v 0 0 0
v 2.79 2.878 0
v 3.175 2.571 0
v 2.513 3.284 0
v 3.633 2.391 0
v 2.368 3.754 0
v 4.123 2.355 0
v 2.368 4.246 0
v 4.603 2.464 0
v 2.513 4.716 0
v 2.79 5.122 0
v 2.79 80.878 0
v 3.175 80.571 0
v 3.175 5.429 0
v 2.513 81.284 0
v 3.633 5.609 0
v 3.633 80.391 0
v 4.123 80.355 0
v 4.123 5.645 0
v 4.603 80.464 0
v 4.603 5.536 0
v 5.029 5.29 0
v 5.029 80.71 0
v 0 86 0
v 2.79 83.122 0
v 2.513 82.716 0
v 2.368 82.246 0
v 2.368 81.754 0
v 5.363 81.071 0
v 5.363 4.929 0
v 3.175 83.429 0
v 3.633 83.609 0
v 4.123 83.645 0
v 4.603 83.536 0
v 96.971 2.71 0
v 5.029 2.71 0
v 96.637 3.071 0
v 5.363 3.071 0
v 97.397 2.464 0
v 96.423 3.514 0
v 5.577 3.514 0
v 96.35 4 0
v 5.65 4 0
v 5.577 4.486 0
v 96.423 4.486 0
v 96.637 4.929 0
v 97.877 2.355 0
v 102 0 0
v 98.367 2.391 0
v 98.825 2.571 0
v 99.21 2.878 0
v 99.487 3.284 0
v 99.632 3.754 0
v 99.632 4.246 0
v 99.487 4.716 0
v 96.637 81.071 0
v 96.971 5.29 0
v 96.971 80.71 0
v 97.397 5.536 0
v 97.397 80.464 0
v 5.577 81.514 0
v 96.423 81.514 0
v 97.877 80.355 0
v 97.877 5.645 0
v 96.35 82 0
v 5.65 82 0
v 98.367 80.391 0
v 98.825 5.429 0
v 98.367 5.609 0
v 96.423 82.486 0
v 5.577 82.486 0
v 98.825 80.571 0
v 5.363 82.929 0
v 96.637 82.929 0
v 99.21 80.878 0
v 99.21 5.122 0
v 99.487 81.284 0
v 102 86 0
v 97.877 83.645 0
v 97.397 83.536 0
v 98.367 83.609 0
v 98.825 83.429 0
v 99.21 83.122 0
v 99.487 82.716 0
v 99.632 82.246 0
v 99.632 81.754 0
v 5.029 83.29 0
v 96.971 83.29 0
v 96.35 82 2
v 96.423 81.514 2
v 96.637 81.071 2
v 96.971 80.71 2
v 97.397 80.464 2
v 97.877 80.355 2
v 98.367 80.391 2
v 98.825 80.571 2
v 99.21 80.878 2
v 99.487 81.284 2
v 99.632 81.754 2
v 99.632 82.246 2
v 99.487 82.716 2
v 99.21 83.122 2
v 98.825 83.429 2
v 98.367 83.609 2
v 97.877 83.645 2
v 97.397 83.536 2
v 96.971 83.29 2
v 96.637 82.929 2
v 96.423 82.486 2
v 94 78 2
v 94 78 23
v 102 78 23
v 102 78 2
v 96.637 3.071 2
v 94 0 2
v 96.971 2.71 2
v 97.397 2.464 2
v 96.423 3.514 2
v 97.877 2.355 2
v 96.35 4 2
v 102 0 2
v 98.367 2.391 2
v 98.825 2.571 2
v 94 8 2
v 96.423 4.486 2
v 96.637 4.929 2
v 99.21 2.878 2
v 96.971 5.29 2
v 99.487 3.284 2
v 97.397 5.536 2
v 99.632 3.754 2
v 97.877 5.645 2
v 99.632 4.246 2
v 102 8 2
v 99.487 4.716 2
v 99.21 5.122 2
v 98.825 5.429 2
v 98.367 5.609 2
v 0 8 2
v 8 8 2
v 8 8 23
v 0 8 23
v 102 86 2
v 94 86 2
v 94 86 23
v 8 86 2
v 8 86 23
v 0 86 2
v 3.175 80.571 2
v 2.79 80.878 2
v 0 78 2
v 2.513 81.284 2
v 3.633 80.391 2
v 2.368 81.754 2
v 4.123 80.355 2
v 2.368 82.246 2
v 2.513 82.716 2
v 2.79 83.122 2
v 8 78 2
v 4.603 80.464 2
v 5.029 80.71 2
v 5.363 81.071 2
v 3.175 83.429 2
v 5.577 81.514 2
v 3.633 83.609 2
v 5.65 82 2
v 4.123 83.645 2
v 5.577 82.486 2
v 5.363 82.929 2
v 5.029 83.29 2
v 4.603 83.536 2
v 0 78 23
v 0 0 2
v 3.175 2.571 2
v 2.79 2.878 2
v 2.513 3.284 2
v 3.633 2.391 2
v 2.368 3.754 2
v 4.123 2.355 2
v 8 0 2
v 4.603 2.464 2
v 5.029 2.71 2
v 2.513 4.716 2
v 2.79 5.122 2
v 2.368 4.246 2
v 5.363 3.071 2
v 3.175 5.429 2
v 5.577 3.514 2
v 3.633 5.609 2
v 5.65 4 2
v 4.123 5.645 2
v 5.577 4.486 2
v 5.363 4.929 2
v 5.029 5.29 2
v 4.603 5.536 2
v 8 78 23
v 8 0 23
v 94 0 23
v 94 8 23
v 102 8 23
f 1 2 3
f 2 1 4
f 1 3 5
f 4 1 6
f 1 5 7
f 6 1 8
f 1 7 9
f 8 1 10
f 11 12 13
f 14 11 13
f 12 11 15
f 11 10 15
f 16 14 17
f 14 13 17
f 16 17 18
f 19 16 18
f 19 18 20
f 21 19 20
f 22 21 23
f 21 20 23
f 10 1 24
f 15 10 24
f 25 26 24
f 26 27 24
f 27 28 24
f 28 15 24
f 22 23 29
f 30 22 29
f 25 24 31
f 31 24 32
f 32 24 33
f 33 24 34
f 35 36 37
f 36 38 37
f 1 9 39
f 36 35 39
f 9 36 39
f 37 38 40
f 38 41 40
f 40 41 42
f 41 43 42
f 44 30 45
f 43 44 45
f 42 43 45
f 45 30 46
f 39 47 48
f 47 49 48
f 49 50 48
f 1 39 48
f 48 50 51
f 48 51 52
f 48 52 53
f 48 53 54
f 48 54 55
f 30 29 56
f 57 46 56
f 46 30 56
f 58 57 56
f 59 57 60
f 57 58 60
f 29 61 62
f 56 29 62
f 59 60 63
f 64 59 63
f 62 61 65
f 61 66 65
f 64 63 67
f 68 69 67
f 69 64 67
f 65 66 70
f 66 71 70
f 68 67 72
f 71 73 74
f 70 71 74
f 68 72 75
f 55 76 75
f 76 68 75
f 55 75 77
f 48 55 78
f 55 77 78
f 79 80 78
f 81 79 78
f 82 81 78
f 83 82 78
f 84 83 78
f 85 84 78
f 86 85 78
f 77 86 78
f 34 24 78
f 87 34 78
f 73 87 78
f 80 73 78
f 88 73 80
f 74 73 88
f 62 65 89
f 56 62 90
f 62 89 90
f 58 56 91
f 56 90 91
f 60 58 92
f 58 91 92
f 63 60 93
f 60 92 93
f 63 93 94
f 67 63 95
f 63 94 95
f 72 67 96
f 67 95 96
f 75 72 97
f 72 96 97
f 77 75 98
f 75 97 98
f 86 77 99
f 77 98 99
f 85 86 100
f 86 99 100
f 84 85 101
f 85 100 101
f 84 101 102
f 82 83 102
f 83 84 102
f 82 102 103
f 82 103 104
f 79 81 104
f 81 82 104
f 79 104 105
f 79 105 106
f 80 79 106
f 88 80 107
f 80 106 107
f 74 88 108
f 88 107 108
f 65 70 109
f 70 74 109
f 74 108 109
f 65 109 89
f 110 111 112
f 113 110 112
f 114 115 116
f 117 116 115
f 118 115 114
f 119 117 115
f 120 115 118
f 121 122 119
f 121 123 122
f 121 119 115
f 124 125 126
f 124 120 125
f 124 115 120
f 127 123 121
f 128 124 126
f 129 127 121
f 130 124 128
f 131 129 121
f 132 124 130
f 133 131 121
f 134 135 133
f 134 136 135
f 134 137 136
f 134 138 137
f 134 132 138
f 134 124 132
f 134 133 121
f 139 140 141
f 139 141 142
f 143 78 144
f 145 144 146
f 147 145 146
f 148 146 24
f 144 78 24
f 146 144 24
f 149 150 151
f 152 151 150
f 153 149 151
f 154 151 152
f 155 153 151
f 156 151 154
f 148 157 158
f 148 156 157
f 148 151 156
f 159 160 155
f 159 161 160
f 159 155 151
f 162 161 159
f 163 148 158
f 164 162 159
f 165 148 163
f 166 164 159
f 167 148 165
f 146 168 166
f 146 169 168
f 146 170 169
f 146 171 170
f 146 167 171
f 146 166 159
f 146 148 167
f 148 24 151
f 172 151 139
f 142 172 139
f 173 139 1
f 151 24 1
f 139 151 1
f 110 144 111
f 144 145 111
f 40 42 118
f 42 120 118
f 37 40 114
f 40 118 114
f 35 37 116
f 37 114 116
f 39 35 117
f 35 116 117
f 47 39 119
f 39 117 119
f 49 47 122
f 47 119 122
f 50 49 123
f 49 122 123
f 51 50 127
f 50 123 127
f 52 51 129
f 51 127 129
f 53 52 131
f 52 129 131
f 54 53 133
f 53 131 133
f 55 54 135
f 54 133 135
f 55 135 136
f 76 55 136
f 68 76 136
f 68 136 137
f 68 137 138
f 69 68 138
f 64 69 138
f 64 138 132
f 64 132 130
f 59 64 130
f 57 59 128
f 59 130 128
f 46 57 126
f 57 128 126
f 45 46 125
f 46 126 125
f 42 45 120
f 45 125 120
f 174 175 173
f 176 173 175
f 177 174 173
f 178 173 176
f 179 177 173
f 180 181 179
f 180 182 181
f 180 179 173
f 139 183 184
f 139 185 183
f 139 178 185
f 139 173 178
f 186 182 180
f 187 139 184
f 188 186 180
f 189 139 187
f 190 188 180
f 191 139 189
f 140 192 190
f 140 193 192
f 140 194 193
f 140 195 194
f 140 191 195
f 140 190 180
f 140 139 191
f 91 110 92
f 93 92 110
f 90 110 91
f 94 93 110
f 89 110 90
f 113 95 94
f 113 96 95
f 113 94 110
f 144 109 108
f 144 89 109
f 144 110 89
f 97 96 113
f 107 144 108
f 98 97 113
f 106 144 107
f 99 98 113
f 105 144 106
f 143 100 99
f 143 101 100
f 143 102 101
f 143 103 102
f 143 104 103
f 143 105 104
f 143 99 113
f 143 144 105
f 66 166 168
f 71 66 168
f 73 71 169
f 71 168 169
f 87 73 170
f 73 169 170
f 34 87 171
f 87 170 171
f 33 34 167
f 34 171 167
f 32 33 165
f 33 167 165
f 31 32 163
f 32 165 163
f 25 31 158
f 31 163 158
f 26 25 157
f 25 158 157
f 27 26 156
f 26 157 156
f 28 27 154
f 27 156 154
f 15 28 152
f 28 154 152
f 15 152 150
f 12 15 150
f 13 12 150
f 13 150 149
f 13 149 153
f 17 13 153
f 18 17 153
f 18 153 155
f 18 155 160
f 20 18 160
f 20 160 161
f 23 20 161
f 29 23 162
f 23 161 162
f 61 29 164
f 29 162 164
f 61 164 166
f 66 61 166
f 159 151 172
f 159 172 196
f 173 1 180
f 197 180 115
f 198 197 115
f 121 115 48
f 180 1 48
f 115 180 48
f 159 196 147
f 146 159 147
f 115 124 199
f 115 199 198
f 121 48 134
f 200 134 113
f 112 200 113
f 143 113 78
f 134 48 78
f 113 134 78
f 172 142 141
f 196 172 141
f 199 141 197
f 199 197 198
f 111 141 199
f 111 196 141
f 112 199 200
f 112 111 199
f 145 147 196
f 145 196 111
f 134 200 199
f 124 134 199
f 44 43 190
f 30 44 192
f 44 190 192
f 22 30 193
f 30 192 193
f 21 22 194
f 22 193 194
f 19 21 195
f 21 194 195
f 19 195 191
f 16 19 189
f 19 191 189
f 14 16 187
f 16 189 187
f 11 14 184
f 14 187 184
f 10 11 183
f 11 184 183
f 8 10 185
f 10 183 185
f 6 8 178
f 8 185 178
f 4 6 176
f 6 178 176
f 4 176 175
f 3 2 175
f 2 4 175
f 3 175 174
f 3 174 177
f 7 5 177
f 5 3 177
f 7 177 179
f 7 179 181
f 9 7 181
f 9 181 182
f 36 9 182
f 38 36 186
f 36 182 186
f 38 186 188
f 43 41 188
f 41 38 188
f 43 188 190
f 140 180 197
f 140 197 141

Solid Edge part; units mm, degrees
sketch "Sketch1" plane through (0, 0, 0) normal (0, 0, 1) x (1, 0, 0)
  line L0 (0, 0) -> (102, 0)
  line L1 (102, 0) -> (102, 86)
  line L2 (102, 86) -> (0, 86)
  line L3 (0, 86) -> (0, 0)
extrude "Protrusion1" add sketch "Sketch1" along normal blind 23
sketch "Sketch2" plane through (51, 43, 23) normal (0, 0, 1) x (1, 0, 0)
  circle A0 centre (-47, 39) radius 1.65
extrude "ExtrudedCutout_1" cut sketch "Sketch2" against normal blind 23
mirror "Mirror1" about plane through (51, 43, 11.5) normal (0, -1, 0) of "ExtrudedCutout_1"
mirror "Mirror2" about plane through (51, 43, 11.5) normal (1, 0, 0) of "ExtrudedCutout_1", "Mirror1"
sketch "Sketch3" plane through (51, 43, 23) normal (0, 0, 1) x (1, 0, 0)
  line L0 (-51, -43) -> (-43, -43)
  line L1 (-43, -43) -> (-43, -35)
  line L2 (-43, -35) -> (-51, -35)
  line L3 (-51, -35) -> (-51, -43)
  line L4 (51, 43) -> (43, 43)
  line L5 (43, 43) -> (43, 35)
  line L6 (43, 35) -> (51, 35)
  line L7 (51, 35) -> (51, 43)
  line L8 (51, -43) -> (51, -35)
  line L9 (51, -35) -> (43, -35)
  line L10 (43, -35) -> (43, -43)
  line L11 (43, -43) -> (51, -43)
  line L12 (-51, 43) -> (-51, 35)
  line L13 (-51, 35) -> (-43, 35)
  line L14 (-43, 35) -> (-43, 43)
  line L15 (-43, 43) -> (-51, 43)
  dimension "D1" = 8
  dimension "D2" = 8
  dimension "D3" = 8
  dimension "D4" = 8
  dimension "D5" = 8
  dimension "D6" = 8
  dimension "D7" = 8
  dimension "D8" = 8
extrude "ExtrudedCutout_2" cut sketch "Sketch3" against normal blind 21
